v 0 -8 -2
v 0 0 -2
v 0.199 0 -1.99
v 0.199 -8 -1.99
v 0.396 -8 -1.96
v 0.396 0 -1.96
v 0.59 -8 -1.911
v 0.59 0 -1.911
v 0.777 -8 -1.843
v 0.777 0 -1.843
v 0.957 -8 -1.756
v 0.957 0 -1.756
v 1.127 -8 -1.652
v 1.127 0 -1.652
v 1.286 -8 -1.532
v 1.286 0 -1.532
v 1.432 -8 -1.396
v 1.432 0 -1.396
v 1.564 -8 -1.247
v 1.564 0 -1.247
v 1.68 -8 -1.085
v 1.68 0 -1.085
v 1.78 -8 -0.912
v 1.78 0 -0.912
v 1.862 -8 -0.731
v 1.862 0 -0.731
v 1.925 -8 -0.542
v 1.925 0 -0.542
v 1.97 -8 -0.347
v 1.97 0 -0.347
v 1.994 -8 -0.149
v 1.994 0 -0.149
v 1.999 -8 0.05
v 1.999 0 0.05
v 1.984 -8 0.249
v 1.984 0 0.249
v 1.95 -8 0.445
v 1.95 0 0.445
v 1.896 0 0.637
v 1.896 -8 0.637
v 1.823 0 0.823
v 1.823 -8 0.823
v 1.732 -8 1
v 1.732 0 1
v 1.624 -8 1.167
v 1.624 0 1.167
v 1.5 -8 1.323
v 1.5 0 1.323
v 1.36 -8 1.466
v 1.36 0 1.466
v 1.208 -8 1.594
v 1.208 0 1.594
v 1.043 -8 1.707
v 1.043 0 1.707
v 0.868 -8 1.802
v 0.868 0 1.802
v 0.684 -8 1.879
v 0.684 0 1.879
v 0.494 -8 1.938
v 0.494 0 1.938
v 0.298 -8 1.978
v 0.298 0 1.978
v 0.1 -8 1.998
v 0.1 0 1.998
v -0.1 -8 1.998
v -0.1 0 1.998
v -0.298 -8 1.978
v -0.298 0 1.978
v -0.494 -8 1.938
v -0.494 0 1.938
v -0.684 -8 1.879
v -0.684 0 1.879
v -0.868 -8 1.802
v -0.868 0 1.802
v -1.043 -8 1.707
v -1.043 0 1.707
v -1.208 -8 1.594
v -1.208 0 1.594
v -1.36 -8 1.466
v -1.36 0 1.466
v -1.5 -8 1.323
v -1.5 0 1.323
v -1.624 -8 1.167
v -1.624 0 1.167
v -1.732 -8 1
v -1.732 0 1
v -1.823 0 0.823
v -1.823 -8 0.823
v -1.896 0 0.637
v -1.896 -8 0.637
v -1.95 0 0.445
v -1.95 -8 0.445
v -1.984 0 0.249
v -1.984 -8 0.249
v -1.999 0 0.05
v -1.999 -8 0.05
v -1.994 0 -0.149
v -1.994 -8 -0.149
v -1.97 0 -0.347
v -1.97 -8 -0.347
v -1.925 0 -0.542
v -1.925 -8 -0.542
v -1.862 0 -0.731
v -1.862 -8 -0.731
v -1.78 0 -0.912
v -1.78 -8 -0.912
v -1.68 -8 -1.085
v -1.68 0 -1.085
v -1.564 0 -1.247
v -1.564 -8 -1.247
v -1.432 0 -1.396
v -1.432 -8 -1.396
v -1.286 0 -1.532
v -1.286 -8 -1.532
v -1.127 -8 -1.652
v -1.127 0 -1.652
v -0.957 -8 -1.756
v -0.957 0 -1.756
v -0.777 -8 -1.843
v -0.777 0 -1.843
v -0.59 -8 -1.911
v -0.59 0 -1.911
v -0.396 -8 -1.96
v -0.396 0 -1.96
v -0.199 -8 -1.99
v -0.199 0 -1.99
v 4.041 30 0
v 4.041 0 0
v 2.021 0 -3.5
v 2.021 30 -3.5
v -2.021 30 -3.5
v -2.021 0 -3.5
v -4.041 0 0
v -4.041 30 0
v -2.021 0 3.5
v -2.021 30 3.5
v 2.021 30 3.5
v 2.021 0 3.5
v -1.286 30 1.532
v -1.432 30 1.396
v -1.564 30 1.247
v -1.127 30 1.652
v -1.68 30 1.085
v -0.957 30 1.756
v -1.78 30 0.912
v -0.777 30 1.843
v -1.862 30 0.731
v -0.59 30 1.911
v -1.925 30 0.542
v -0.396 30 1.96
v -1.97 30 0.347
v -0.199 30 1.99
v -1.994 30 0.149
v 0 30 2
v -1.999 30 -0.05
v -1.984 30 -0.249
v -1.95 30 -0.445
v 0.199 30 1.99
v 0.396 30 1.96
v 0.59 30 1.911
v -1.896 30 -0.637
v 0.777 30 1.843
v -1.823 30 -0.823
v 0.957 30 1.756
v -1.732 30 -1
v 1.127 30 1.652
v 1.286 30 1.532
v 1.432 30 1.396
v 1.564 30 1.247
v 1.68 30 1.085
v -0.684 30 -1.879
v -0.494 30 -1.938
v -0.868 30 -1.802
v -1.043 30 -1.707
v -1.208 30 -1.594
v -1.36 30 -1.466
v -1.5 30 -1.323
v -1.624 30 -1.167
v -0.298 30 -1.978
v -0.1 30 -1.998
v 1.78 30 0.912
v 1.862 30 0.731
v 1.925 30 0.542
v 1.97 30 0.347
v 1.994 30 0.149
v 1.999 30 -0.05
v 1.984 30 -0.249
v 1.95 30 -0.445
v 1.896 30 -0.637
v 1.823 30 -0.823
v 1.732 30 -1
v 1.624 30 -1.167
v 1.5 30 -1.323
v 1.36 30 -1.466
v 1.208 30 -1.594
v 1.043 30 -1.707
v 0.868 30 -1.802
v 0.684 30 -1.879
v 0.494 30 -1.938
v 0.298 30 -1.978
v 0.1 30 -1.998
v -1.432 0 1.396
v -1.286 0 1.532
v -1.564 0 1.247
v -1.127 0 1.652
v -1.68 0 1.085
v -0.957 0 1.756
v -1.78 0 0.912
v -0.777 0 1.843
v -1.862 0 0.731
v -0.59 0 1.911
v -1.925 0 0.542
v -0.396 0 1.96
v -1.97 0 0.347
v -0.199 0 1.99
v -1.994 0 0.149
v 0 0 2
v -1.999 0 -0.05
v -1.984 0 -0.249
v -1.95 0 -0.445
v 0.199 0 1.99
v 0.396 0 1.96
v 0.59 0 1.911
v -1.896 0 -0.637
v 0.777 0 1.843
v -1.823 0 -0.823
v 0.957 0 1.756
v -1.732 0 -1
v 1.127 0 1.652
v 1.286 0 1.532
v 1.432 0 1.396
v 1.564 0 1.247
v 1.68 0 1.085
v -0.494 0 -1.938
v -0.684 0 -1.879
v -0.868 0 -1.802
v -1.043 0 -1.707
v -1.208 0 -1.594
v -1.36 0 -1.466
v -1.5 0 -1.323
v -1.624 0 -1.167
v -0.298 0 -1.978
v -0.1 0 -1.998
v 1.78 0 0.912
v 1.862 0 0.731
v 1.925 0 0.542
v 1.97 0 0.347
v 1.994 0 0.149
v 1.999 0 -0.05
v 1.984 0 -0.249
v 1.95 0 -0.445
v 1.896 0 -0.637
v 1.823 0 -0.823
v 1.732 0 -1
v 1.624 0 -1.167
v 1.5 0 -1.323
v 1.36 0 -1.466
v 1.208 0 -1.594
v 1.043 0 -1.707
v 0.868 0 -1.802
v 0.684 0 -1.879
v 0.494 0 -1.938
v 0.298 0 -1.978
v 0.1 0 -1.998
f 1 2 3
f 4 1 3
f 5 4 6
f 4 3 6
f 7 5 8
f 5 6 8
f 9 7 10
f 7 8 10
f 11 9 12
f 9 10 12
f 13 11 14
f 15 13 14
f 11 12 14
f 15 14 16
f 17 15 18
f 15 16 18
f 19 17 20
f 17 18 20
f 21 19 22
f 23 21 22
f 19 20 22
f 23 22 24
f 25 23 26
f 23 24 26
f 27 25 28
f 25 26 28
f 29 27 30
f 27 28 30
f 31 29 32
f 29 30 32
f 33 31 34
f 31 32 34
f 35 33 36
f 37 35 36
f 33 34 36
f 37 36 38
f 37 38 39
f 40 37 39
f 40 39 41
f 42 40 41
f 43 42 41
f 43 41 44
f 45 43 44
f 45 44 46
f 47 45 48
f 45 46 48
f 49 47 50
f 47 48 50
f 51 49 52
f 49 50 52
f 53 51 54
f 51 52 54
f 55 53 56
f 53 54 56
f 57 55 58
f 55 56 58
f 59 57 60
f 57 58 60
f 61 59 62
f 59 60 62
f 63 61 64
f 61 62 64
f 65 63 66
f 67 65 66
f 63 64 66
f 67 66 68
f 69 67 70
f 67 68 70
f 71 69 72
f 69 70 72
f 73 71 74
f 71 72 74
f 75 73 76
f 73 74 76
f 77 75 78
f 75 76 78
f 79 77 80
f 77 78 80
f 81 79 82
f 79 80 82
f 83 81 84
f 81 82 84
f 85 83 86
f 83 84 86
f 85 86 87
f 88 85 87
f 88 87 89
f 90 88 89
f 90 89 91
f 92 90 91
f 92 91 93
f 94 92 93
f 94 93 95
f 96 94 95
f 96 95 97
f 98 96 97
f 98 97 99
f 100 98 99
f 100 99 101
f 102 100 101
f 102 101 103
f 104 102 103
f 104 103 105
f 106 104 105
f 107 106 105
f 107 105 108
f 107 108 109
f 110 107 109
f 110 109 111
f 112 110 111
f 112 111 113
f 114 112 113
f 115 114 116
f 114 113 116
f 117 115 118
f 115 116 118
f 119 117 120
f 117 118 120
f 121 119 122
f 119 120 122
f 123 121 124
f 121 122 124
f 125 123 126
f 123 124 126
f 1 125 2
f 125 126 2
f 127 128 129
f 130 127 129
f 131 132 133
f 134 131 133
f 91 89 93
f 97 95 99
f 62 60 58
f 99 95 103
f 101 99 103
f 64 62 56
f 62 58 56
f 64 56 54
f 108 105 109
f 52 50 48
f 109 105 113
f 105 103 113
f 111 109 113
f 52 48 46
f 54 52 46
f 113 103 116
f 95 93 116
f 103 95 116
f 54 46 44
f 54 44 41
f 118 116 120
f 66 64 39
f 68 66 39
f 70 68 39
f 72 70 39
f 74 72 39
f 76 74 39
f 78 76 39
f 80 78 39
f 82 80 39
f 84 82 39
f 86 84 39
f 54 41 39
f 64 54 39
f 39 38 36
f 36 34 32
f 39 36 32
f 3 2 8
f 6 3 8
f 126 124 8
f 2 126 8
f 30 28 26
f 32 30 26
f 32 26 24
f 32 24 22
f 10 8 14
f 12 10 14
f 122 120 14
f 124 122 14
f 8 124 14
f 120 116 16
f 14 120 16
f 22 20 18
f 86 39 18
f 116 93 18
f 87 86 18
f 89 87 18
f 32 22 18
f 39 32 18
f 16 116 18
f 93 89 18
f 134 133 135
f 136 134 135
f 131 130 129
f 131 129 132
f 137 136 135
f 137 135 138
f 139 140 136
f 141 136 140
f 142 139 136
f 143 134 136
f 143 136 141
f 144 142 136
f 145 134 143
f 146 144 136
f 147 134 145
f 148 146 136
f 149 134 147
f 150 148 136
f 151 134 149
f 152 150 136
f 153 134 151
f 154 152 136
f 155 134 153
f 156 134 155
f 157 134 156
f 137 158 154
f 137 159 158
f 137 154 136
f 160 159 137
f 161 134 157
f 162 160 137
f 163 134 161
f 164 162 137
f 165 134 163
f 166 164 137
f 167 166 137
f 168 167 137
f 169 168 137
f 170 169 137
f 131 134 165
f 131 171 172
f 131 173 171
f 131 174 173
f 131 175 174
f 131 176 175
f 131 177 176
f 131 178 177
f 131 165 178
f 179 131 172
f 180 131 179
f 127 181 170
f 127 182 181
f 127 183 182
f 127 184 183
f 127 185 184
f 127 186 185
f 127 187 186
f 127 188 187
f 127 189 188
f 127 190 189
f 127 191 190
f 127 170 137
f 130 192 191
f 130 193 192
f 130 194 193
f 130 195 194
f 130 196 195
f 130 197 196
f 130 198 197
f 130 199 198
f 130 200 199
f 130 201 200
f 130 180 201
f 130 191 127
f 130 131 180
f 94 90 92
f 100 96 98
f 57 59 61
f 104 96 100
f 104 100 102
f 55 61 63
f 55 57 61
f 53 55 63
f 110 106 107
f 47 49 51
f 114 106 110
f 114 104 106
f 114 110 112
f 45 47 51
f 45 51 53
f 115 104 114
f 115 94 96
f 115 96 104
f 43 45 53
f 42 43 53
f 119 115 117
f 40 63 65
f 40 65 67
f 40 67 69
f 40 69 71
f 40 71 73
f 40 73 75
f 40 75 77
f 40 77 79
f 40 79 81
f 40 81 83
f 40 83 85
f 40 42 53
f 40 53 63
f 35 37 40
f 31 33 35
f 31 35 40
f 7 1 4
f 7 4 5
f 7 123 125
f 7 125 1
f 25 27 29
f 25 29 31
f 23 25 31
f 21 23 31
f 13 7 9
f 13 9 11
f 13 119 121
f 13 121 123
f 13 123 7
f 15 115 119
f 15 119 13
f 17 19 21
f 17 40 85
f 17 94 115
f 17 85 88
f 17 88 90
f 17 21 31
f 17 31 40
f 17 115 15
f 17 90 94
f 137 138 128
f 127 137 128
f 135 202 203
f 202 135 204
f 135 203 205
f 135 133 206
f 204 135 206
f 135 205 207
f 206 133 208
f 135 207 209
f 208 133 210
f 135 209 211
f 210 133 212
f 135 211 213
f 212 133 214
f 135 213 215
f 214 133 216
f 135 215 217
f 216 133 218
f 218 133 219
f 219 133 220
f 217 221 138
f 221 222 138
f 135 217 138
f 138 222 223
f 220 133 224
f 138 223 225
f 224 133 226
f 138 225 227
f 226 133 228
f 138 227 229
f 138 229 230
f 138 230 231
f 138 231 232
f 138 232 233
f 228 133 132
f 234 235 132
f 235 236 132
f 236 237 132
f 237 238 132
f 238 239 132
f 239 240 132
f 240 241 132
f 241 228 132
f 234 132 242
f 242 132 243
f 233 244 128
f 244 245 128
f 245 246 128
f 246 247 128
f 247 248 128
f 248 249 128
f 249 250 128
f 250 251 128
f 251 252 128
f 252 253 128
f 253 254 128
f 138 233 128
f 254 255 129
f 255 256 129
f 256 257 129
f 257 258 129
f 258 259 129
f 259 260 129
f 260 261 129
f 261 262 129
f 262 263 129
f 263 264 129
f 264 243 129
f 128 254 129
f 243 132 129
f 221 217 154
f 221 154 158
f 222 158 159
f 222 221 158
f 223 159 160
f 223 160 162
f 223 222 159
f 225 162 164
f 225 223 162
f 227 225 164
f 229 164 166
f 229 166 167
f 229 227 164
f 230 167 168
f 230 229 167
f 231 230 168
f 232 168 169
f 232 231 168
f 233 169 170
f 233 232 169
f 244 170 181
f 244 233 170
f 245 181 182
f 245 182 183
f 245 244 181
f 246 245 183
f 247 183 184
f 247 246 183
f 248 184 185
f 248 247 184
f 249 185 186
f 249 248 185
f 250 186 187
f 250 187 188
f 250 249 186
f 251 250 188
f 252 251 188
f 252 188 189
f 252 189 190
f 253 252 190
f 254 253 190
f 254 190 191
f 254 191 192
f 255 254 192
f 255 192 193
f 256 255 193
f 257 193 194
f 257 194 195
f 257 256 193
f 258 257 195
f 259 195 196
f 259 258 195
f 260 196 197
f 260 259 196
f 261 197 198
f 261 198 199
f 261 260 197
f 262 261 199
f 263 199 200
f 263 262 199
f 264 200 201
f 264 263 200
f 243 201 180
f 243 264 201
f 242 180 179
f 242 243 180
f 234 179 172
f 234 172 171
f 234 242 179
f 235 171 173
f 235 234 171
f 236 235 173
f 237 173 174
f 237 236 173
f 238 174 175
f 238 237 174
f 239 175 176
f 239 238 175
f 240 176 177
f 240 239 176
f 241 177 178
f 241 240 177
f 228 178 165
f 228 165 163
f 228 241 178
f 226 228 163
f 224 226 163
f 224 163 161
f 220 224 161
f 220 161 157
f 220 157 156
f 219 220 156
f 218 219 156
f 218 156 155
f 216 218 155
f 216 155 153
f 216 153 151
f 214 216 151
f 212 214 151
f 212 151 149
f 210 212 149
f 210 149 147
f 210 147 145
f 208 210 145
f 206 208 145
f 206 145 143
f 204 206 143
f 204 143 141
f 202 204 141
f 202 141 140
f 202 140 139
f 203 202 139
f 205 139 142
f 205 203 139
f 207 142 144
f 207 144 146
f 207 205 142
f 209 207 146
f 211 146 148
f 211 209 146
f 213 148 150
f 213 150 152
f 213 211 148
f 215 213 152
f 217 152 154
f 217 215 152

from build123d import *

# Parameters (mm, degrees)
SKETCH_1_R      = 2
EXTRUDE_1_DEPTH = 30
SKETCH_2_R      = 2
EXTRUDE_2_DEPTH = 8


with BuildPart() as part:
    # 草图1 → 凸台-拉伸1 (new body)
    with BuildSketch(Plane(origin=(0, 0, 0), x_dir=(1, 0, 0), z_dir=(0, 1, 0))):
        Polygon((4.041451884, 0), (2.020725942, 3.5), (-2.020725942, 3.5), (-4.041451884, 0), (-2.020725942, -3.5), (2.020725942, -3.5), align=None)
        with Locations(Location((0, 0, 0), (0, 0, 270))):
            Circle(SKETCH_1_R, mode=Mode.SUBTRACT)
    extrude(amount=EXTRUDE_1_DEPTH)


with BuildPart() as body_2:
    # 草图2 → 凸台-拉伸2 (new body)
    with BuildSketch(Plane.XZ):
        with Locations(Location((0, 0, 0), (0, 0, 270))):
            Circle(SKETCH_2_R)
    extrude(amount=EXTRUDE_2_DEPTH)


solid = Compound([part.part, body_2.part])
